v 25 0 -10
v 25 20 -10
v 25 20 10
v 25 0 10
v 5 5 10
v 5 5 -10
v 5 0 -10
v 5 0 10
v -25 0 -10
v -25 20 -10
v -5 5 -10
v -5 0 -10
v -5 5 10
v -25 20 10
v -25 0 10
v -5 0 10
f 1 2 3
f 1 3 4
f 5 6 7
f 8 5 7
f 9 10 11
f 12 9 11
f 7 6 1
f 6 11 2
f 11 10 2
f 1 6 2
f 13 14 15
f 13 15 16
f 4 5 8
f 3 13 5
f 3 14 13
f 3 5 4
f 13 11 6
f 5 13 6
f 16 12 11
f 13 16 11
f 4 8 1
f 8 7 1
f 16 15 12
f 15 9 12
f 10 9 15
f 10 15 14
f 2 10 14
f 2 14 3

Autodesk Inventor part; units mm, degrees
ref_plane "YZ Plane" through (0, 0, 0) normal (1, 0, 0) x (0, 1, 0)
ref_plane "XZ Plane" through (0, 0, 0) normal (0, 1, 0) x (-1, 0, 0)
ref_plane "XY Plane" through (0, 0, 0) normal (0, 0, 1) x (1, 0, 0)
sketch "Sketch1" plane through (0, 0, 0) normal (0, 0, 1) x (1, 0, 0)
  line L0 (-25, 20) -> (25, 20)
  line L1 (25, 20) -> (25, 0)
  line L2 (-25, 0) -> (-25, 20)
  line L3 (-25, 0) -> (-5, 0)
  line L4 (-5, 0) -> (-5, 5)
  line L5 (-5, 5) -> (5, 5)
  line L6 (5, 5) -> (4.4322, 5)
  line L7 (5, 5) -> (5, 0)
  line L8 (5, 0) -> (25, 0)
  point P0 (0, 0)
  dimension "d0" = 50
  dimension "d1" = 20
  dimension "d3" = 25
  dimension "d4" = 20
  dimension "d5" = 5
  dimension "d6" = 10
  dimension "d7" = 5
  dimension "d8" = 20
extrude "Extrusion1" add sketch "Sketch1" along normal mid plane 20
properties part number "block"
